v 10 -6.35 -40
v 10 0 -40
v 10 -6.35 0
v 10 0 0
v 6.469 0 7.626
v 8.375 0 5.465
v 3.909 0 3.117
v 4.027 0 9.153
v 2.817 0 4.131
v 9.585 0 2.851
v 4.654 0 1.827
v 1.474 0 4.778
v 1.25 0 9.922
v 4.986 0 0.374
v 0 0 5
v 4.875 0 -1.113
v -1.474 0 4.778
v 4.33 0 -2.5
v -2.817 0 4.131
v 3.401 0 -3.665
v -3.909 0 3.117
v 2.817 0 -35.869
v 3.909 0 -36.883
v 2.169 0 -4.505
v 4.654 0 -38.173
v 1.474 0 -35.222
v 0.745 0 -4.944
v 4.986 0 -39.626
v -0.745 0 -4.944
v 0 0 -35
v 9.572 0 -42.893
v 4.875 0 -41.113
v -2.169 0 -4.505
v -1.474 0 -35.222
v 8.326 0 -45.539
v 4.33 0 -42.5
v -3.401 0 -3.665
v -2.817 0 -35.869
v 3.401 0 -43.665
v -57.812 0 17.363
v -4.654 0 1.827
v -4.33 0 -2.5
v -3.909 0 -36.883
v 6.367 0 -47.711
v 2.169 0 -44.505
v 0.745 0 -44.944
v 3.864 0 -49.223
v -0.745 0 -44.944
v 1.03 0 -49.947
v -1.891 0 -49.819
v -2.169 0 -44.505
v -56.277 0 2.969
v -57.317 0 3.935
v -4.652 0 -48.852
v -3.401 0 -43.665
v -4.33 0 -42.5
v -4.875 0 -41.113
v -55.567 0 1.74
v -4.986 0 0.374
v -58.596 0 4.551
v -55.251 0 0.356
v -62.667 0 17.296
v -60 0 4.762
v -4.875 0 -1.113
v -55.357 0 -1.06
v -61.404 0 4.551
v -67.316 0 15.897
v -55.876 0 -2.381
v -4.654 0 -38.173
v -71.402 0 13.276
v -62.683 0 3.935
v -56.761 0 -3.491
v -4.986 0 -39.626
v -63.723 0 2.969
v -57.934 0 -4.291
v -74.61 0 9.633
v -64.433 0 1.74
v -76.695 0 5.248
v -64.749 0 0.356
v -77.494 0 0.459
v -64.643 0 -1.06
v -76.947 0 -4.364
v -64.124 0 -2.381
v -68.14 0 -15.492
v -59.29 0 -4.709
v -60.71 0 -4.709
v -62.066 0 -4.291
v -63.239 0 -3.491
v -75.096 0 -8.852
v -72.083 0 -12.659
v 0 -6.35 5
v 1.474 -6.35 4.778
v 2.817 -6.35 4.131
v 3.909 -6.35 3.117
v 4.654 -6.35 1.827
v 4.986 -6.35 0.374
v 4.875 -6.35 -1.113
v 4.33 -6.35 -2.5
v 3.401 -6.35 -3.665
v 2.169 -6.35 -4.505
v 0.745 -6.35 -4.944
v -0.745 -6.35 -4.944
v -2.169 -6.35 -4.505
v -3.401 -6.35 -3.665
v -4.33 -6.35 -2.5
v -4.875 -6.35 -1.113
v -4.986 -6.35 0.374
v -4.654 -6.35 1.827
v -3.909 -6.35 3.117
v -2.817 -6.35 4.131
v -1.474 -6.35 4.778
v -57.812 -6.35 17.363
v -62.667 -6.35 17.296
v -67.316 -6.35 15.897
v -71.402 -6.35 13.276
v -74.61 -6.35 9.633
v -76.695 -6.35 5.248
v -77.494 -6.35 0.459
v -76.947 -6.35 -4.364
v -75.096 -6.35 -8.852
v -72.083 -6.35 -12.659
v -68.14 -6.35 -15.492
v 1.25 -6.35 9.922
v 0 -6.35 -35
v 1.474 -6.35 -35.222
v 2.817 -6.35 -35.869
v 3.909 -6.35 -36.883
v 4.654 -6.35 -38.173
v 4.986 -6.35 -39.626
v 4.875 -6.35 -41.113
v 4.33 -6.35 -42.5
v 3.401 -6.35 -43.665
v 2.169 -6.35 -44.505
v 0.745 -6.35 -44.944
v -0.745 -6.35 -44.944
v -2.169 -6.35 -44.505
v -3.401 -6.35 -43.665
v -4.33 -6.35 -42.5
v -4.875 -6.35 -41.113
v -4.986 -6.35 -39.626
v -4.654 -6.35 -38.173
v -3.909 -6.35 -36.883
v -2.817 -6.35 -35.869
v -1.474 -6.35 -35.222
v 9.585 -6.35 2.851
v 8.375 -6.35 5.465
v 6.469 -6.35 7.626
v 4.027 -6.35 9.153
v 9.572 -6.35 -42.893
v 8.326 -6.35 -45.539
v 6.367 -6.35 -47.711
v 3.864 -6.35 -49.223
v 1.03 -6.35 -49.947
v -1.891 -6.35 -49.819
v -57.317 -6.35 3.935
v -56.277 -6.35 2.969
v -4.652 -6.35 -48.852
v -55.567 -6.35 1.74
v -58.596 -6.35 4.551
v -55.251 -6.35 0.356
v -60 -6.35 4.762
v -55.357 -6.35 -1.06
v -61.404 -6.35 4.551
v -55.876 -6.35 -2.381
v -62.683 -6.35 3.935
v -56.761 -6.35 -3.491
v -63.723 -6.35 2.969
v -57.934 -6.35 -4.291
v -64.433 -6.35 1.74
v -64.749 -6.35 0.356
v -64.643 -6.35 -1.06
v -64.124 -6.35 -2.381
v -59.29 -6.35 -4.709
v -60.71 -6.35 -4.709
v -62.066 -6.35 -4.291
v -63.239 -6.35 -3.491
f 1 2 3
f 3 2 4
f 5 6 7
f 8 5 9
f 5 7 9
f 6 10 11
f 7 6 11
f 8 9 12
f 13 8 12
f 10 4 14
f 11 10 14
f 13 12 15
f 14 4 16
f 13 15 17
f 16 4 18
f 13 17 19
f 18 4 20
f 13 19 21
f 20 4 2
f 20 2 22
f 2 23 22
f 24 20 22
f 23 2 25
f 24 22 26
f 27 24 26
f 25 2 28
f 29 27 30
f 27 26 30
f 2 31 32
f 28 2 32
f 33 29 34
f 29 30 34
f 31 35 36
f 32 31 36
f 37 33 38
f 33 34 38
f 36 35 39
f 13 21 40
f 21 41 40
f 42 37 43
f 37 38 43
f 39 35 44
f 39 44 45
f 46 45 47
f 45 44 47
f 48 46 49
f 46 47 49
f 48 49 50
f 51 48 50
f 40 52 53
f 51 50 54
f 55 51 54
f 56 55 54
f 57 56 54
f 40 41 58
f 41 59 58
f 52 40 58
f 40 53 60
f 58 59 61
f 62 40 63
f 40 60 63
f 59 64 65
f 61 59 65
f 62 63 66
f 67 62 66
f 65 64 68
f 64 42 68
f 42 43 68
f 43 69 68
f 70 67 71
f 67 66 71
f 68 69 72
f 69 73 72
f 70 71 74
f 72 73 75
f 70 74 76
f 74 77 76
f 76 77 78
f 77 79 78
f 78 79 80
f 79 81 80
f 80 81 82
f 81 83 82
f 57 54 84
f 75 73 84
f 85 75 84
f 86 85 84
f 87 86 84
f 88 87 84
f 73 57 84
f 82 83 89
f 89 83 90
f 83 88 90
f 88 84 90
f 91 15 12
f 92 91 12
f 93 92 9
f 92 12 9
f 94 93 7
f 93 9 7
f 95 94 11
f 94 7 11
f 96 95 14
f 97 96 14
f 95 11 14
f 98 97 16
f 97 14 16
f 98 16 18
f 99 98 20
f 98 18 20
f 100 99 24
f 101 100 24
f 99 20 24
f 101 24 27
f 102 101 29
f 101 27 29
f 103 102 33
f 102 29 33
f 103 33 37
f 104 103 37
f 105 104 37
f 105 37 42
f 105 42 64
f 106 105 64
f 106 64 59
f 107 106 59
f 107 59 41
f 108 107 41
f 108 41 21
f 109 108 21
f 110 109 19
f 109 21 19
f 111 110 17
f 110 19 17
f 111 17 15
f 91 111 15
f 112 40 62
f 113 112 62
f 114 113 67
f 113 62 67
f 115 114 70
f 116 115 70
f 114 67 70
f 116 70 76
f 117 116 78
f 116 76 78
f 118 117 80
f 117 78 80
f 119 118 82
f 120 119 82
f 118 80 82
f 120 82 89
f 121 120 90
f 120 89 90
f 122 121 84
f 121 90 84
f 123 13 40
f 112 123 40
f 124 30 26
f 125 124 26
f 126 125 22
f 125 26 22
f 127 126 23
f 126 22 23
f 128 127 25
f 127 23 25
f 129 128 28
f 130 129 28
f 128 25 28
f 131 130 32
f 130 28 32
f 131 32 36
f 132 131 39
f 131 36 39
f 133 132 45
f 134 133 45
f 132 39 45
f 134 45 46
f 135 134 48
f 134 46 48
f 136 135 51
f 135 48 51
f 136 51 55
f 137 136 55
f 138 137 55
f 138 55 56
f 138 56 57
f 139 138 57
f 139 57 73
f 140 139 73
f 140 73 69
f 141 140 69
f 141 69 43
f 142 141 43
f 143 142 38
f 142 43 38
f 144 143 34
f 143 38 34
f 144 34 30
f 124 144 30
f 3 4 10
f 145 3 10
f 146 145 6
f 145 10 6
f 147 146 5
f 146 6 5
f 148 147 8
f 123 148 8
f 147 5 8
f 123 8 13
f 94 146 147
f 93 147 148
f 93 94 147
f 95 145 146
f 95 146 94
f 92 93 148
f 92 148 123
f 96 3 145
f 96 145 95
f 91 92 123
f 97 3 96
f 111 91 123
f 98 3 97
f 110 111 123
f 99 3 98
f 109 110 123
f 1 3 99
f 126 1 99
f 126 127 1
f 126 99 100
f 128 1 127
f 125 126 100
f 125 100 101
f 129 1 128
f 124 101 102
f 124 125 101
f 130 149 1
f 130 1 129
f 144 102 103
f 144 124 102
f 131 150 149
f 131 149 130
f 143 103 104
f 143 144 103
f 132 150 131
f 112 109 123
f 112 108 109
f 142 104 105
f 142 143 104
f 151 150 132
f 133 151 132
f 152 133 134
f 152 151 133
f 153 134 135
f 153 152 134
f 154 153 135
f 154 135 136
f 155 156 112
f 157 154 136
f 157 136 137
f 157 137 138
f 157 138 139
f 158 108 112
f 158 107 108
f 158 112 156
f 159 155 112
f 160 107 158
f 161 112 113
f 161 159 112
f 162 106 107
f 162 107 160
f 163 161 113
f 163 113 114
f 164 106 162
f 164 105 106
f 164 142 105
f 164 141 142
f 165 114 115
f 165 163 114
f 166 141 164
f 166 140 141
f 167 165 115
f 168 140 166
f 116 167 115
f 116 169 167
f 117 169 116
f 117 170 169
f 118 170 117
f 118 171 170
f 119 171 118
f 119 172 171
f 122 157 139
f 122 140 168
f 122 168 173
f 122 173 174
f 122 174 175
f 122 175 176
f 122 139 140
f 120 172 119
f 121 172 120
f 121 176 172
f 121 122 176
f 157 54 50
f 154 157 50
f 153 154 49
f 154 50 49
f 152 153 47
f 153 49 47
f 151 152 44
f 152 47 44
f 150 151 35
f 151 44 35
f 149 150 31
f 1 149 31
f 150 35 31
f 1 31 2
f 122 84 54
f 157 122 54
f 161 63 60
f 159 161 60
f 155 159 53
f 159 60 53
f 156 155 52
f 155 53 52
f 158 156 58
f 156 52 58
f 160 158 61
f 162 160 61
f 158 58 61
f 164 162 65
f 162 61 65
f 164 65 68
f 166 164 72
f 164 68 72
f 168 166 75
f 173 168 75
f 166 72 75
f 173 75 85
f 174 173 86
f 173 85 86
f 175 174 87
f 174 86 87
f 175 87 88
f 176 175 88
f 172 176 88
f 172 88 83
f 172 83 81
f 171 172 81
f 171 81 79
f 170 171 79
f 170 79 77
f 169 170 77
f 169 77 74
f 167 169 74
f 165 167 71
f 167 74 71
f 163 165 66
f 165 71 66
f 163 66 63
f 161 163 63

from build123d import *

# Parameters (mm, degrees)
SKETCH1_R           = 5
SKETCH1_R_2         = 4.7625
BOSS_EXTRUDE1_DEPTH = 6.35


with BuildPart() as part:
    # Sketch1 → Boss-Extrude1 (new body)
    with BuildSketch(Plane(origin=(0, 0, 0), x_dir=(1, 0, 0), z_dir=(0, 1, 0))):
        with BuildLine():
            Line((10, 40), (10, 0))
            ThreePointArc((10, 0), (7.5, -6.614378278), (1.25, -9.921567416))
            Line((1.25, -9.921567416), (-57.8125, -17.362742979))
            ThreePointArc((-57.8125, -17.362742979), (-76.694591069, -5.247916638), (-68.140184424, 15.491526637))
            Line((-68.140184424, 15.491526637), (-4.651533957, 48.852300935))
            ThreePointArc((-4.651533957, 48.852300935), (5.171298697, 48.559069446), (10, 40))
        make_face()
        with Locations(Location((0, 0, 0), (0, 0, 270))):
            Circle(SKETCH1_R, mode=Mode.SUBTRACT)
        with Locations(Location((0, 40, 0), (0, 0, 270))):
            Circle(SKETCH1_R, mode=Mode.SUBTRACT)
        with Locations(Location((-60, 0, 0), (0, 0, 270))):
            Circle(SKETCH1_R_2, mode=Mode.SUBTRACT)
    extrude(amount=-BOSS_EXTRUDE1_DEPTH)


solid = part.part
